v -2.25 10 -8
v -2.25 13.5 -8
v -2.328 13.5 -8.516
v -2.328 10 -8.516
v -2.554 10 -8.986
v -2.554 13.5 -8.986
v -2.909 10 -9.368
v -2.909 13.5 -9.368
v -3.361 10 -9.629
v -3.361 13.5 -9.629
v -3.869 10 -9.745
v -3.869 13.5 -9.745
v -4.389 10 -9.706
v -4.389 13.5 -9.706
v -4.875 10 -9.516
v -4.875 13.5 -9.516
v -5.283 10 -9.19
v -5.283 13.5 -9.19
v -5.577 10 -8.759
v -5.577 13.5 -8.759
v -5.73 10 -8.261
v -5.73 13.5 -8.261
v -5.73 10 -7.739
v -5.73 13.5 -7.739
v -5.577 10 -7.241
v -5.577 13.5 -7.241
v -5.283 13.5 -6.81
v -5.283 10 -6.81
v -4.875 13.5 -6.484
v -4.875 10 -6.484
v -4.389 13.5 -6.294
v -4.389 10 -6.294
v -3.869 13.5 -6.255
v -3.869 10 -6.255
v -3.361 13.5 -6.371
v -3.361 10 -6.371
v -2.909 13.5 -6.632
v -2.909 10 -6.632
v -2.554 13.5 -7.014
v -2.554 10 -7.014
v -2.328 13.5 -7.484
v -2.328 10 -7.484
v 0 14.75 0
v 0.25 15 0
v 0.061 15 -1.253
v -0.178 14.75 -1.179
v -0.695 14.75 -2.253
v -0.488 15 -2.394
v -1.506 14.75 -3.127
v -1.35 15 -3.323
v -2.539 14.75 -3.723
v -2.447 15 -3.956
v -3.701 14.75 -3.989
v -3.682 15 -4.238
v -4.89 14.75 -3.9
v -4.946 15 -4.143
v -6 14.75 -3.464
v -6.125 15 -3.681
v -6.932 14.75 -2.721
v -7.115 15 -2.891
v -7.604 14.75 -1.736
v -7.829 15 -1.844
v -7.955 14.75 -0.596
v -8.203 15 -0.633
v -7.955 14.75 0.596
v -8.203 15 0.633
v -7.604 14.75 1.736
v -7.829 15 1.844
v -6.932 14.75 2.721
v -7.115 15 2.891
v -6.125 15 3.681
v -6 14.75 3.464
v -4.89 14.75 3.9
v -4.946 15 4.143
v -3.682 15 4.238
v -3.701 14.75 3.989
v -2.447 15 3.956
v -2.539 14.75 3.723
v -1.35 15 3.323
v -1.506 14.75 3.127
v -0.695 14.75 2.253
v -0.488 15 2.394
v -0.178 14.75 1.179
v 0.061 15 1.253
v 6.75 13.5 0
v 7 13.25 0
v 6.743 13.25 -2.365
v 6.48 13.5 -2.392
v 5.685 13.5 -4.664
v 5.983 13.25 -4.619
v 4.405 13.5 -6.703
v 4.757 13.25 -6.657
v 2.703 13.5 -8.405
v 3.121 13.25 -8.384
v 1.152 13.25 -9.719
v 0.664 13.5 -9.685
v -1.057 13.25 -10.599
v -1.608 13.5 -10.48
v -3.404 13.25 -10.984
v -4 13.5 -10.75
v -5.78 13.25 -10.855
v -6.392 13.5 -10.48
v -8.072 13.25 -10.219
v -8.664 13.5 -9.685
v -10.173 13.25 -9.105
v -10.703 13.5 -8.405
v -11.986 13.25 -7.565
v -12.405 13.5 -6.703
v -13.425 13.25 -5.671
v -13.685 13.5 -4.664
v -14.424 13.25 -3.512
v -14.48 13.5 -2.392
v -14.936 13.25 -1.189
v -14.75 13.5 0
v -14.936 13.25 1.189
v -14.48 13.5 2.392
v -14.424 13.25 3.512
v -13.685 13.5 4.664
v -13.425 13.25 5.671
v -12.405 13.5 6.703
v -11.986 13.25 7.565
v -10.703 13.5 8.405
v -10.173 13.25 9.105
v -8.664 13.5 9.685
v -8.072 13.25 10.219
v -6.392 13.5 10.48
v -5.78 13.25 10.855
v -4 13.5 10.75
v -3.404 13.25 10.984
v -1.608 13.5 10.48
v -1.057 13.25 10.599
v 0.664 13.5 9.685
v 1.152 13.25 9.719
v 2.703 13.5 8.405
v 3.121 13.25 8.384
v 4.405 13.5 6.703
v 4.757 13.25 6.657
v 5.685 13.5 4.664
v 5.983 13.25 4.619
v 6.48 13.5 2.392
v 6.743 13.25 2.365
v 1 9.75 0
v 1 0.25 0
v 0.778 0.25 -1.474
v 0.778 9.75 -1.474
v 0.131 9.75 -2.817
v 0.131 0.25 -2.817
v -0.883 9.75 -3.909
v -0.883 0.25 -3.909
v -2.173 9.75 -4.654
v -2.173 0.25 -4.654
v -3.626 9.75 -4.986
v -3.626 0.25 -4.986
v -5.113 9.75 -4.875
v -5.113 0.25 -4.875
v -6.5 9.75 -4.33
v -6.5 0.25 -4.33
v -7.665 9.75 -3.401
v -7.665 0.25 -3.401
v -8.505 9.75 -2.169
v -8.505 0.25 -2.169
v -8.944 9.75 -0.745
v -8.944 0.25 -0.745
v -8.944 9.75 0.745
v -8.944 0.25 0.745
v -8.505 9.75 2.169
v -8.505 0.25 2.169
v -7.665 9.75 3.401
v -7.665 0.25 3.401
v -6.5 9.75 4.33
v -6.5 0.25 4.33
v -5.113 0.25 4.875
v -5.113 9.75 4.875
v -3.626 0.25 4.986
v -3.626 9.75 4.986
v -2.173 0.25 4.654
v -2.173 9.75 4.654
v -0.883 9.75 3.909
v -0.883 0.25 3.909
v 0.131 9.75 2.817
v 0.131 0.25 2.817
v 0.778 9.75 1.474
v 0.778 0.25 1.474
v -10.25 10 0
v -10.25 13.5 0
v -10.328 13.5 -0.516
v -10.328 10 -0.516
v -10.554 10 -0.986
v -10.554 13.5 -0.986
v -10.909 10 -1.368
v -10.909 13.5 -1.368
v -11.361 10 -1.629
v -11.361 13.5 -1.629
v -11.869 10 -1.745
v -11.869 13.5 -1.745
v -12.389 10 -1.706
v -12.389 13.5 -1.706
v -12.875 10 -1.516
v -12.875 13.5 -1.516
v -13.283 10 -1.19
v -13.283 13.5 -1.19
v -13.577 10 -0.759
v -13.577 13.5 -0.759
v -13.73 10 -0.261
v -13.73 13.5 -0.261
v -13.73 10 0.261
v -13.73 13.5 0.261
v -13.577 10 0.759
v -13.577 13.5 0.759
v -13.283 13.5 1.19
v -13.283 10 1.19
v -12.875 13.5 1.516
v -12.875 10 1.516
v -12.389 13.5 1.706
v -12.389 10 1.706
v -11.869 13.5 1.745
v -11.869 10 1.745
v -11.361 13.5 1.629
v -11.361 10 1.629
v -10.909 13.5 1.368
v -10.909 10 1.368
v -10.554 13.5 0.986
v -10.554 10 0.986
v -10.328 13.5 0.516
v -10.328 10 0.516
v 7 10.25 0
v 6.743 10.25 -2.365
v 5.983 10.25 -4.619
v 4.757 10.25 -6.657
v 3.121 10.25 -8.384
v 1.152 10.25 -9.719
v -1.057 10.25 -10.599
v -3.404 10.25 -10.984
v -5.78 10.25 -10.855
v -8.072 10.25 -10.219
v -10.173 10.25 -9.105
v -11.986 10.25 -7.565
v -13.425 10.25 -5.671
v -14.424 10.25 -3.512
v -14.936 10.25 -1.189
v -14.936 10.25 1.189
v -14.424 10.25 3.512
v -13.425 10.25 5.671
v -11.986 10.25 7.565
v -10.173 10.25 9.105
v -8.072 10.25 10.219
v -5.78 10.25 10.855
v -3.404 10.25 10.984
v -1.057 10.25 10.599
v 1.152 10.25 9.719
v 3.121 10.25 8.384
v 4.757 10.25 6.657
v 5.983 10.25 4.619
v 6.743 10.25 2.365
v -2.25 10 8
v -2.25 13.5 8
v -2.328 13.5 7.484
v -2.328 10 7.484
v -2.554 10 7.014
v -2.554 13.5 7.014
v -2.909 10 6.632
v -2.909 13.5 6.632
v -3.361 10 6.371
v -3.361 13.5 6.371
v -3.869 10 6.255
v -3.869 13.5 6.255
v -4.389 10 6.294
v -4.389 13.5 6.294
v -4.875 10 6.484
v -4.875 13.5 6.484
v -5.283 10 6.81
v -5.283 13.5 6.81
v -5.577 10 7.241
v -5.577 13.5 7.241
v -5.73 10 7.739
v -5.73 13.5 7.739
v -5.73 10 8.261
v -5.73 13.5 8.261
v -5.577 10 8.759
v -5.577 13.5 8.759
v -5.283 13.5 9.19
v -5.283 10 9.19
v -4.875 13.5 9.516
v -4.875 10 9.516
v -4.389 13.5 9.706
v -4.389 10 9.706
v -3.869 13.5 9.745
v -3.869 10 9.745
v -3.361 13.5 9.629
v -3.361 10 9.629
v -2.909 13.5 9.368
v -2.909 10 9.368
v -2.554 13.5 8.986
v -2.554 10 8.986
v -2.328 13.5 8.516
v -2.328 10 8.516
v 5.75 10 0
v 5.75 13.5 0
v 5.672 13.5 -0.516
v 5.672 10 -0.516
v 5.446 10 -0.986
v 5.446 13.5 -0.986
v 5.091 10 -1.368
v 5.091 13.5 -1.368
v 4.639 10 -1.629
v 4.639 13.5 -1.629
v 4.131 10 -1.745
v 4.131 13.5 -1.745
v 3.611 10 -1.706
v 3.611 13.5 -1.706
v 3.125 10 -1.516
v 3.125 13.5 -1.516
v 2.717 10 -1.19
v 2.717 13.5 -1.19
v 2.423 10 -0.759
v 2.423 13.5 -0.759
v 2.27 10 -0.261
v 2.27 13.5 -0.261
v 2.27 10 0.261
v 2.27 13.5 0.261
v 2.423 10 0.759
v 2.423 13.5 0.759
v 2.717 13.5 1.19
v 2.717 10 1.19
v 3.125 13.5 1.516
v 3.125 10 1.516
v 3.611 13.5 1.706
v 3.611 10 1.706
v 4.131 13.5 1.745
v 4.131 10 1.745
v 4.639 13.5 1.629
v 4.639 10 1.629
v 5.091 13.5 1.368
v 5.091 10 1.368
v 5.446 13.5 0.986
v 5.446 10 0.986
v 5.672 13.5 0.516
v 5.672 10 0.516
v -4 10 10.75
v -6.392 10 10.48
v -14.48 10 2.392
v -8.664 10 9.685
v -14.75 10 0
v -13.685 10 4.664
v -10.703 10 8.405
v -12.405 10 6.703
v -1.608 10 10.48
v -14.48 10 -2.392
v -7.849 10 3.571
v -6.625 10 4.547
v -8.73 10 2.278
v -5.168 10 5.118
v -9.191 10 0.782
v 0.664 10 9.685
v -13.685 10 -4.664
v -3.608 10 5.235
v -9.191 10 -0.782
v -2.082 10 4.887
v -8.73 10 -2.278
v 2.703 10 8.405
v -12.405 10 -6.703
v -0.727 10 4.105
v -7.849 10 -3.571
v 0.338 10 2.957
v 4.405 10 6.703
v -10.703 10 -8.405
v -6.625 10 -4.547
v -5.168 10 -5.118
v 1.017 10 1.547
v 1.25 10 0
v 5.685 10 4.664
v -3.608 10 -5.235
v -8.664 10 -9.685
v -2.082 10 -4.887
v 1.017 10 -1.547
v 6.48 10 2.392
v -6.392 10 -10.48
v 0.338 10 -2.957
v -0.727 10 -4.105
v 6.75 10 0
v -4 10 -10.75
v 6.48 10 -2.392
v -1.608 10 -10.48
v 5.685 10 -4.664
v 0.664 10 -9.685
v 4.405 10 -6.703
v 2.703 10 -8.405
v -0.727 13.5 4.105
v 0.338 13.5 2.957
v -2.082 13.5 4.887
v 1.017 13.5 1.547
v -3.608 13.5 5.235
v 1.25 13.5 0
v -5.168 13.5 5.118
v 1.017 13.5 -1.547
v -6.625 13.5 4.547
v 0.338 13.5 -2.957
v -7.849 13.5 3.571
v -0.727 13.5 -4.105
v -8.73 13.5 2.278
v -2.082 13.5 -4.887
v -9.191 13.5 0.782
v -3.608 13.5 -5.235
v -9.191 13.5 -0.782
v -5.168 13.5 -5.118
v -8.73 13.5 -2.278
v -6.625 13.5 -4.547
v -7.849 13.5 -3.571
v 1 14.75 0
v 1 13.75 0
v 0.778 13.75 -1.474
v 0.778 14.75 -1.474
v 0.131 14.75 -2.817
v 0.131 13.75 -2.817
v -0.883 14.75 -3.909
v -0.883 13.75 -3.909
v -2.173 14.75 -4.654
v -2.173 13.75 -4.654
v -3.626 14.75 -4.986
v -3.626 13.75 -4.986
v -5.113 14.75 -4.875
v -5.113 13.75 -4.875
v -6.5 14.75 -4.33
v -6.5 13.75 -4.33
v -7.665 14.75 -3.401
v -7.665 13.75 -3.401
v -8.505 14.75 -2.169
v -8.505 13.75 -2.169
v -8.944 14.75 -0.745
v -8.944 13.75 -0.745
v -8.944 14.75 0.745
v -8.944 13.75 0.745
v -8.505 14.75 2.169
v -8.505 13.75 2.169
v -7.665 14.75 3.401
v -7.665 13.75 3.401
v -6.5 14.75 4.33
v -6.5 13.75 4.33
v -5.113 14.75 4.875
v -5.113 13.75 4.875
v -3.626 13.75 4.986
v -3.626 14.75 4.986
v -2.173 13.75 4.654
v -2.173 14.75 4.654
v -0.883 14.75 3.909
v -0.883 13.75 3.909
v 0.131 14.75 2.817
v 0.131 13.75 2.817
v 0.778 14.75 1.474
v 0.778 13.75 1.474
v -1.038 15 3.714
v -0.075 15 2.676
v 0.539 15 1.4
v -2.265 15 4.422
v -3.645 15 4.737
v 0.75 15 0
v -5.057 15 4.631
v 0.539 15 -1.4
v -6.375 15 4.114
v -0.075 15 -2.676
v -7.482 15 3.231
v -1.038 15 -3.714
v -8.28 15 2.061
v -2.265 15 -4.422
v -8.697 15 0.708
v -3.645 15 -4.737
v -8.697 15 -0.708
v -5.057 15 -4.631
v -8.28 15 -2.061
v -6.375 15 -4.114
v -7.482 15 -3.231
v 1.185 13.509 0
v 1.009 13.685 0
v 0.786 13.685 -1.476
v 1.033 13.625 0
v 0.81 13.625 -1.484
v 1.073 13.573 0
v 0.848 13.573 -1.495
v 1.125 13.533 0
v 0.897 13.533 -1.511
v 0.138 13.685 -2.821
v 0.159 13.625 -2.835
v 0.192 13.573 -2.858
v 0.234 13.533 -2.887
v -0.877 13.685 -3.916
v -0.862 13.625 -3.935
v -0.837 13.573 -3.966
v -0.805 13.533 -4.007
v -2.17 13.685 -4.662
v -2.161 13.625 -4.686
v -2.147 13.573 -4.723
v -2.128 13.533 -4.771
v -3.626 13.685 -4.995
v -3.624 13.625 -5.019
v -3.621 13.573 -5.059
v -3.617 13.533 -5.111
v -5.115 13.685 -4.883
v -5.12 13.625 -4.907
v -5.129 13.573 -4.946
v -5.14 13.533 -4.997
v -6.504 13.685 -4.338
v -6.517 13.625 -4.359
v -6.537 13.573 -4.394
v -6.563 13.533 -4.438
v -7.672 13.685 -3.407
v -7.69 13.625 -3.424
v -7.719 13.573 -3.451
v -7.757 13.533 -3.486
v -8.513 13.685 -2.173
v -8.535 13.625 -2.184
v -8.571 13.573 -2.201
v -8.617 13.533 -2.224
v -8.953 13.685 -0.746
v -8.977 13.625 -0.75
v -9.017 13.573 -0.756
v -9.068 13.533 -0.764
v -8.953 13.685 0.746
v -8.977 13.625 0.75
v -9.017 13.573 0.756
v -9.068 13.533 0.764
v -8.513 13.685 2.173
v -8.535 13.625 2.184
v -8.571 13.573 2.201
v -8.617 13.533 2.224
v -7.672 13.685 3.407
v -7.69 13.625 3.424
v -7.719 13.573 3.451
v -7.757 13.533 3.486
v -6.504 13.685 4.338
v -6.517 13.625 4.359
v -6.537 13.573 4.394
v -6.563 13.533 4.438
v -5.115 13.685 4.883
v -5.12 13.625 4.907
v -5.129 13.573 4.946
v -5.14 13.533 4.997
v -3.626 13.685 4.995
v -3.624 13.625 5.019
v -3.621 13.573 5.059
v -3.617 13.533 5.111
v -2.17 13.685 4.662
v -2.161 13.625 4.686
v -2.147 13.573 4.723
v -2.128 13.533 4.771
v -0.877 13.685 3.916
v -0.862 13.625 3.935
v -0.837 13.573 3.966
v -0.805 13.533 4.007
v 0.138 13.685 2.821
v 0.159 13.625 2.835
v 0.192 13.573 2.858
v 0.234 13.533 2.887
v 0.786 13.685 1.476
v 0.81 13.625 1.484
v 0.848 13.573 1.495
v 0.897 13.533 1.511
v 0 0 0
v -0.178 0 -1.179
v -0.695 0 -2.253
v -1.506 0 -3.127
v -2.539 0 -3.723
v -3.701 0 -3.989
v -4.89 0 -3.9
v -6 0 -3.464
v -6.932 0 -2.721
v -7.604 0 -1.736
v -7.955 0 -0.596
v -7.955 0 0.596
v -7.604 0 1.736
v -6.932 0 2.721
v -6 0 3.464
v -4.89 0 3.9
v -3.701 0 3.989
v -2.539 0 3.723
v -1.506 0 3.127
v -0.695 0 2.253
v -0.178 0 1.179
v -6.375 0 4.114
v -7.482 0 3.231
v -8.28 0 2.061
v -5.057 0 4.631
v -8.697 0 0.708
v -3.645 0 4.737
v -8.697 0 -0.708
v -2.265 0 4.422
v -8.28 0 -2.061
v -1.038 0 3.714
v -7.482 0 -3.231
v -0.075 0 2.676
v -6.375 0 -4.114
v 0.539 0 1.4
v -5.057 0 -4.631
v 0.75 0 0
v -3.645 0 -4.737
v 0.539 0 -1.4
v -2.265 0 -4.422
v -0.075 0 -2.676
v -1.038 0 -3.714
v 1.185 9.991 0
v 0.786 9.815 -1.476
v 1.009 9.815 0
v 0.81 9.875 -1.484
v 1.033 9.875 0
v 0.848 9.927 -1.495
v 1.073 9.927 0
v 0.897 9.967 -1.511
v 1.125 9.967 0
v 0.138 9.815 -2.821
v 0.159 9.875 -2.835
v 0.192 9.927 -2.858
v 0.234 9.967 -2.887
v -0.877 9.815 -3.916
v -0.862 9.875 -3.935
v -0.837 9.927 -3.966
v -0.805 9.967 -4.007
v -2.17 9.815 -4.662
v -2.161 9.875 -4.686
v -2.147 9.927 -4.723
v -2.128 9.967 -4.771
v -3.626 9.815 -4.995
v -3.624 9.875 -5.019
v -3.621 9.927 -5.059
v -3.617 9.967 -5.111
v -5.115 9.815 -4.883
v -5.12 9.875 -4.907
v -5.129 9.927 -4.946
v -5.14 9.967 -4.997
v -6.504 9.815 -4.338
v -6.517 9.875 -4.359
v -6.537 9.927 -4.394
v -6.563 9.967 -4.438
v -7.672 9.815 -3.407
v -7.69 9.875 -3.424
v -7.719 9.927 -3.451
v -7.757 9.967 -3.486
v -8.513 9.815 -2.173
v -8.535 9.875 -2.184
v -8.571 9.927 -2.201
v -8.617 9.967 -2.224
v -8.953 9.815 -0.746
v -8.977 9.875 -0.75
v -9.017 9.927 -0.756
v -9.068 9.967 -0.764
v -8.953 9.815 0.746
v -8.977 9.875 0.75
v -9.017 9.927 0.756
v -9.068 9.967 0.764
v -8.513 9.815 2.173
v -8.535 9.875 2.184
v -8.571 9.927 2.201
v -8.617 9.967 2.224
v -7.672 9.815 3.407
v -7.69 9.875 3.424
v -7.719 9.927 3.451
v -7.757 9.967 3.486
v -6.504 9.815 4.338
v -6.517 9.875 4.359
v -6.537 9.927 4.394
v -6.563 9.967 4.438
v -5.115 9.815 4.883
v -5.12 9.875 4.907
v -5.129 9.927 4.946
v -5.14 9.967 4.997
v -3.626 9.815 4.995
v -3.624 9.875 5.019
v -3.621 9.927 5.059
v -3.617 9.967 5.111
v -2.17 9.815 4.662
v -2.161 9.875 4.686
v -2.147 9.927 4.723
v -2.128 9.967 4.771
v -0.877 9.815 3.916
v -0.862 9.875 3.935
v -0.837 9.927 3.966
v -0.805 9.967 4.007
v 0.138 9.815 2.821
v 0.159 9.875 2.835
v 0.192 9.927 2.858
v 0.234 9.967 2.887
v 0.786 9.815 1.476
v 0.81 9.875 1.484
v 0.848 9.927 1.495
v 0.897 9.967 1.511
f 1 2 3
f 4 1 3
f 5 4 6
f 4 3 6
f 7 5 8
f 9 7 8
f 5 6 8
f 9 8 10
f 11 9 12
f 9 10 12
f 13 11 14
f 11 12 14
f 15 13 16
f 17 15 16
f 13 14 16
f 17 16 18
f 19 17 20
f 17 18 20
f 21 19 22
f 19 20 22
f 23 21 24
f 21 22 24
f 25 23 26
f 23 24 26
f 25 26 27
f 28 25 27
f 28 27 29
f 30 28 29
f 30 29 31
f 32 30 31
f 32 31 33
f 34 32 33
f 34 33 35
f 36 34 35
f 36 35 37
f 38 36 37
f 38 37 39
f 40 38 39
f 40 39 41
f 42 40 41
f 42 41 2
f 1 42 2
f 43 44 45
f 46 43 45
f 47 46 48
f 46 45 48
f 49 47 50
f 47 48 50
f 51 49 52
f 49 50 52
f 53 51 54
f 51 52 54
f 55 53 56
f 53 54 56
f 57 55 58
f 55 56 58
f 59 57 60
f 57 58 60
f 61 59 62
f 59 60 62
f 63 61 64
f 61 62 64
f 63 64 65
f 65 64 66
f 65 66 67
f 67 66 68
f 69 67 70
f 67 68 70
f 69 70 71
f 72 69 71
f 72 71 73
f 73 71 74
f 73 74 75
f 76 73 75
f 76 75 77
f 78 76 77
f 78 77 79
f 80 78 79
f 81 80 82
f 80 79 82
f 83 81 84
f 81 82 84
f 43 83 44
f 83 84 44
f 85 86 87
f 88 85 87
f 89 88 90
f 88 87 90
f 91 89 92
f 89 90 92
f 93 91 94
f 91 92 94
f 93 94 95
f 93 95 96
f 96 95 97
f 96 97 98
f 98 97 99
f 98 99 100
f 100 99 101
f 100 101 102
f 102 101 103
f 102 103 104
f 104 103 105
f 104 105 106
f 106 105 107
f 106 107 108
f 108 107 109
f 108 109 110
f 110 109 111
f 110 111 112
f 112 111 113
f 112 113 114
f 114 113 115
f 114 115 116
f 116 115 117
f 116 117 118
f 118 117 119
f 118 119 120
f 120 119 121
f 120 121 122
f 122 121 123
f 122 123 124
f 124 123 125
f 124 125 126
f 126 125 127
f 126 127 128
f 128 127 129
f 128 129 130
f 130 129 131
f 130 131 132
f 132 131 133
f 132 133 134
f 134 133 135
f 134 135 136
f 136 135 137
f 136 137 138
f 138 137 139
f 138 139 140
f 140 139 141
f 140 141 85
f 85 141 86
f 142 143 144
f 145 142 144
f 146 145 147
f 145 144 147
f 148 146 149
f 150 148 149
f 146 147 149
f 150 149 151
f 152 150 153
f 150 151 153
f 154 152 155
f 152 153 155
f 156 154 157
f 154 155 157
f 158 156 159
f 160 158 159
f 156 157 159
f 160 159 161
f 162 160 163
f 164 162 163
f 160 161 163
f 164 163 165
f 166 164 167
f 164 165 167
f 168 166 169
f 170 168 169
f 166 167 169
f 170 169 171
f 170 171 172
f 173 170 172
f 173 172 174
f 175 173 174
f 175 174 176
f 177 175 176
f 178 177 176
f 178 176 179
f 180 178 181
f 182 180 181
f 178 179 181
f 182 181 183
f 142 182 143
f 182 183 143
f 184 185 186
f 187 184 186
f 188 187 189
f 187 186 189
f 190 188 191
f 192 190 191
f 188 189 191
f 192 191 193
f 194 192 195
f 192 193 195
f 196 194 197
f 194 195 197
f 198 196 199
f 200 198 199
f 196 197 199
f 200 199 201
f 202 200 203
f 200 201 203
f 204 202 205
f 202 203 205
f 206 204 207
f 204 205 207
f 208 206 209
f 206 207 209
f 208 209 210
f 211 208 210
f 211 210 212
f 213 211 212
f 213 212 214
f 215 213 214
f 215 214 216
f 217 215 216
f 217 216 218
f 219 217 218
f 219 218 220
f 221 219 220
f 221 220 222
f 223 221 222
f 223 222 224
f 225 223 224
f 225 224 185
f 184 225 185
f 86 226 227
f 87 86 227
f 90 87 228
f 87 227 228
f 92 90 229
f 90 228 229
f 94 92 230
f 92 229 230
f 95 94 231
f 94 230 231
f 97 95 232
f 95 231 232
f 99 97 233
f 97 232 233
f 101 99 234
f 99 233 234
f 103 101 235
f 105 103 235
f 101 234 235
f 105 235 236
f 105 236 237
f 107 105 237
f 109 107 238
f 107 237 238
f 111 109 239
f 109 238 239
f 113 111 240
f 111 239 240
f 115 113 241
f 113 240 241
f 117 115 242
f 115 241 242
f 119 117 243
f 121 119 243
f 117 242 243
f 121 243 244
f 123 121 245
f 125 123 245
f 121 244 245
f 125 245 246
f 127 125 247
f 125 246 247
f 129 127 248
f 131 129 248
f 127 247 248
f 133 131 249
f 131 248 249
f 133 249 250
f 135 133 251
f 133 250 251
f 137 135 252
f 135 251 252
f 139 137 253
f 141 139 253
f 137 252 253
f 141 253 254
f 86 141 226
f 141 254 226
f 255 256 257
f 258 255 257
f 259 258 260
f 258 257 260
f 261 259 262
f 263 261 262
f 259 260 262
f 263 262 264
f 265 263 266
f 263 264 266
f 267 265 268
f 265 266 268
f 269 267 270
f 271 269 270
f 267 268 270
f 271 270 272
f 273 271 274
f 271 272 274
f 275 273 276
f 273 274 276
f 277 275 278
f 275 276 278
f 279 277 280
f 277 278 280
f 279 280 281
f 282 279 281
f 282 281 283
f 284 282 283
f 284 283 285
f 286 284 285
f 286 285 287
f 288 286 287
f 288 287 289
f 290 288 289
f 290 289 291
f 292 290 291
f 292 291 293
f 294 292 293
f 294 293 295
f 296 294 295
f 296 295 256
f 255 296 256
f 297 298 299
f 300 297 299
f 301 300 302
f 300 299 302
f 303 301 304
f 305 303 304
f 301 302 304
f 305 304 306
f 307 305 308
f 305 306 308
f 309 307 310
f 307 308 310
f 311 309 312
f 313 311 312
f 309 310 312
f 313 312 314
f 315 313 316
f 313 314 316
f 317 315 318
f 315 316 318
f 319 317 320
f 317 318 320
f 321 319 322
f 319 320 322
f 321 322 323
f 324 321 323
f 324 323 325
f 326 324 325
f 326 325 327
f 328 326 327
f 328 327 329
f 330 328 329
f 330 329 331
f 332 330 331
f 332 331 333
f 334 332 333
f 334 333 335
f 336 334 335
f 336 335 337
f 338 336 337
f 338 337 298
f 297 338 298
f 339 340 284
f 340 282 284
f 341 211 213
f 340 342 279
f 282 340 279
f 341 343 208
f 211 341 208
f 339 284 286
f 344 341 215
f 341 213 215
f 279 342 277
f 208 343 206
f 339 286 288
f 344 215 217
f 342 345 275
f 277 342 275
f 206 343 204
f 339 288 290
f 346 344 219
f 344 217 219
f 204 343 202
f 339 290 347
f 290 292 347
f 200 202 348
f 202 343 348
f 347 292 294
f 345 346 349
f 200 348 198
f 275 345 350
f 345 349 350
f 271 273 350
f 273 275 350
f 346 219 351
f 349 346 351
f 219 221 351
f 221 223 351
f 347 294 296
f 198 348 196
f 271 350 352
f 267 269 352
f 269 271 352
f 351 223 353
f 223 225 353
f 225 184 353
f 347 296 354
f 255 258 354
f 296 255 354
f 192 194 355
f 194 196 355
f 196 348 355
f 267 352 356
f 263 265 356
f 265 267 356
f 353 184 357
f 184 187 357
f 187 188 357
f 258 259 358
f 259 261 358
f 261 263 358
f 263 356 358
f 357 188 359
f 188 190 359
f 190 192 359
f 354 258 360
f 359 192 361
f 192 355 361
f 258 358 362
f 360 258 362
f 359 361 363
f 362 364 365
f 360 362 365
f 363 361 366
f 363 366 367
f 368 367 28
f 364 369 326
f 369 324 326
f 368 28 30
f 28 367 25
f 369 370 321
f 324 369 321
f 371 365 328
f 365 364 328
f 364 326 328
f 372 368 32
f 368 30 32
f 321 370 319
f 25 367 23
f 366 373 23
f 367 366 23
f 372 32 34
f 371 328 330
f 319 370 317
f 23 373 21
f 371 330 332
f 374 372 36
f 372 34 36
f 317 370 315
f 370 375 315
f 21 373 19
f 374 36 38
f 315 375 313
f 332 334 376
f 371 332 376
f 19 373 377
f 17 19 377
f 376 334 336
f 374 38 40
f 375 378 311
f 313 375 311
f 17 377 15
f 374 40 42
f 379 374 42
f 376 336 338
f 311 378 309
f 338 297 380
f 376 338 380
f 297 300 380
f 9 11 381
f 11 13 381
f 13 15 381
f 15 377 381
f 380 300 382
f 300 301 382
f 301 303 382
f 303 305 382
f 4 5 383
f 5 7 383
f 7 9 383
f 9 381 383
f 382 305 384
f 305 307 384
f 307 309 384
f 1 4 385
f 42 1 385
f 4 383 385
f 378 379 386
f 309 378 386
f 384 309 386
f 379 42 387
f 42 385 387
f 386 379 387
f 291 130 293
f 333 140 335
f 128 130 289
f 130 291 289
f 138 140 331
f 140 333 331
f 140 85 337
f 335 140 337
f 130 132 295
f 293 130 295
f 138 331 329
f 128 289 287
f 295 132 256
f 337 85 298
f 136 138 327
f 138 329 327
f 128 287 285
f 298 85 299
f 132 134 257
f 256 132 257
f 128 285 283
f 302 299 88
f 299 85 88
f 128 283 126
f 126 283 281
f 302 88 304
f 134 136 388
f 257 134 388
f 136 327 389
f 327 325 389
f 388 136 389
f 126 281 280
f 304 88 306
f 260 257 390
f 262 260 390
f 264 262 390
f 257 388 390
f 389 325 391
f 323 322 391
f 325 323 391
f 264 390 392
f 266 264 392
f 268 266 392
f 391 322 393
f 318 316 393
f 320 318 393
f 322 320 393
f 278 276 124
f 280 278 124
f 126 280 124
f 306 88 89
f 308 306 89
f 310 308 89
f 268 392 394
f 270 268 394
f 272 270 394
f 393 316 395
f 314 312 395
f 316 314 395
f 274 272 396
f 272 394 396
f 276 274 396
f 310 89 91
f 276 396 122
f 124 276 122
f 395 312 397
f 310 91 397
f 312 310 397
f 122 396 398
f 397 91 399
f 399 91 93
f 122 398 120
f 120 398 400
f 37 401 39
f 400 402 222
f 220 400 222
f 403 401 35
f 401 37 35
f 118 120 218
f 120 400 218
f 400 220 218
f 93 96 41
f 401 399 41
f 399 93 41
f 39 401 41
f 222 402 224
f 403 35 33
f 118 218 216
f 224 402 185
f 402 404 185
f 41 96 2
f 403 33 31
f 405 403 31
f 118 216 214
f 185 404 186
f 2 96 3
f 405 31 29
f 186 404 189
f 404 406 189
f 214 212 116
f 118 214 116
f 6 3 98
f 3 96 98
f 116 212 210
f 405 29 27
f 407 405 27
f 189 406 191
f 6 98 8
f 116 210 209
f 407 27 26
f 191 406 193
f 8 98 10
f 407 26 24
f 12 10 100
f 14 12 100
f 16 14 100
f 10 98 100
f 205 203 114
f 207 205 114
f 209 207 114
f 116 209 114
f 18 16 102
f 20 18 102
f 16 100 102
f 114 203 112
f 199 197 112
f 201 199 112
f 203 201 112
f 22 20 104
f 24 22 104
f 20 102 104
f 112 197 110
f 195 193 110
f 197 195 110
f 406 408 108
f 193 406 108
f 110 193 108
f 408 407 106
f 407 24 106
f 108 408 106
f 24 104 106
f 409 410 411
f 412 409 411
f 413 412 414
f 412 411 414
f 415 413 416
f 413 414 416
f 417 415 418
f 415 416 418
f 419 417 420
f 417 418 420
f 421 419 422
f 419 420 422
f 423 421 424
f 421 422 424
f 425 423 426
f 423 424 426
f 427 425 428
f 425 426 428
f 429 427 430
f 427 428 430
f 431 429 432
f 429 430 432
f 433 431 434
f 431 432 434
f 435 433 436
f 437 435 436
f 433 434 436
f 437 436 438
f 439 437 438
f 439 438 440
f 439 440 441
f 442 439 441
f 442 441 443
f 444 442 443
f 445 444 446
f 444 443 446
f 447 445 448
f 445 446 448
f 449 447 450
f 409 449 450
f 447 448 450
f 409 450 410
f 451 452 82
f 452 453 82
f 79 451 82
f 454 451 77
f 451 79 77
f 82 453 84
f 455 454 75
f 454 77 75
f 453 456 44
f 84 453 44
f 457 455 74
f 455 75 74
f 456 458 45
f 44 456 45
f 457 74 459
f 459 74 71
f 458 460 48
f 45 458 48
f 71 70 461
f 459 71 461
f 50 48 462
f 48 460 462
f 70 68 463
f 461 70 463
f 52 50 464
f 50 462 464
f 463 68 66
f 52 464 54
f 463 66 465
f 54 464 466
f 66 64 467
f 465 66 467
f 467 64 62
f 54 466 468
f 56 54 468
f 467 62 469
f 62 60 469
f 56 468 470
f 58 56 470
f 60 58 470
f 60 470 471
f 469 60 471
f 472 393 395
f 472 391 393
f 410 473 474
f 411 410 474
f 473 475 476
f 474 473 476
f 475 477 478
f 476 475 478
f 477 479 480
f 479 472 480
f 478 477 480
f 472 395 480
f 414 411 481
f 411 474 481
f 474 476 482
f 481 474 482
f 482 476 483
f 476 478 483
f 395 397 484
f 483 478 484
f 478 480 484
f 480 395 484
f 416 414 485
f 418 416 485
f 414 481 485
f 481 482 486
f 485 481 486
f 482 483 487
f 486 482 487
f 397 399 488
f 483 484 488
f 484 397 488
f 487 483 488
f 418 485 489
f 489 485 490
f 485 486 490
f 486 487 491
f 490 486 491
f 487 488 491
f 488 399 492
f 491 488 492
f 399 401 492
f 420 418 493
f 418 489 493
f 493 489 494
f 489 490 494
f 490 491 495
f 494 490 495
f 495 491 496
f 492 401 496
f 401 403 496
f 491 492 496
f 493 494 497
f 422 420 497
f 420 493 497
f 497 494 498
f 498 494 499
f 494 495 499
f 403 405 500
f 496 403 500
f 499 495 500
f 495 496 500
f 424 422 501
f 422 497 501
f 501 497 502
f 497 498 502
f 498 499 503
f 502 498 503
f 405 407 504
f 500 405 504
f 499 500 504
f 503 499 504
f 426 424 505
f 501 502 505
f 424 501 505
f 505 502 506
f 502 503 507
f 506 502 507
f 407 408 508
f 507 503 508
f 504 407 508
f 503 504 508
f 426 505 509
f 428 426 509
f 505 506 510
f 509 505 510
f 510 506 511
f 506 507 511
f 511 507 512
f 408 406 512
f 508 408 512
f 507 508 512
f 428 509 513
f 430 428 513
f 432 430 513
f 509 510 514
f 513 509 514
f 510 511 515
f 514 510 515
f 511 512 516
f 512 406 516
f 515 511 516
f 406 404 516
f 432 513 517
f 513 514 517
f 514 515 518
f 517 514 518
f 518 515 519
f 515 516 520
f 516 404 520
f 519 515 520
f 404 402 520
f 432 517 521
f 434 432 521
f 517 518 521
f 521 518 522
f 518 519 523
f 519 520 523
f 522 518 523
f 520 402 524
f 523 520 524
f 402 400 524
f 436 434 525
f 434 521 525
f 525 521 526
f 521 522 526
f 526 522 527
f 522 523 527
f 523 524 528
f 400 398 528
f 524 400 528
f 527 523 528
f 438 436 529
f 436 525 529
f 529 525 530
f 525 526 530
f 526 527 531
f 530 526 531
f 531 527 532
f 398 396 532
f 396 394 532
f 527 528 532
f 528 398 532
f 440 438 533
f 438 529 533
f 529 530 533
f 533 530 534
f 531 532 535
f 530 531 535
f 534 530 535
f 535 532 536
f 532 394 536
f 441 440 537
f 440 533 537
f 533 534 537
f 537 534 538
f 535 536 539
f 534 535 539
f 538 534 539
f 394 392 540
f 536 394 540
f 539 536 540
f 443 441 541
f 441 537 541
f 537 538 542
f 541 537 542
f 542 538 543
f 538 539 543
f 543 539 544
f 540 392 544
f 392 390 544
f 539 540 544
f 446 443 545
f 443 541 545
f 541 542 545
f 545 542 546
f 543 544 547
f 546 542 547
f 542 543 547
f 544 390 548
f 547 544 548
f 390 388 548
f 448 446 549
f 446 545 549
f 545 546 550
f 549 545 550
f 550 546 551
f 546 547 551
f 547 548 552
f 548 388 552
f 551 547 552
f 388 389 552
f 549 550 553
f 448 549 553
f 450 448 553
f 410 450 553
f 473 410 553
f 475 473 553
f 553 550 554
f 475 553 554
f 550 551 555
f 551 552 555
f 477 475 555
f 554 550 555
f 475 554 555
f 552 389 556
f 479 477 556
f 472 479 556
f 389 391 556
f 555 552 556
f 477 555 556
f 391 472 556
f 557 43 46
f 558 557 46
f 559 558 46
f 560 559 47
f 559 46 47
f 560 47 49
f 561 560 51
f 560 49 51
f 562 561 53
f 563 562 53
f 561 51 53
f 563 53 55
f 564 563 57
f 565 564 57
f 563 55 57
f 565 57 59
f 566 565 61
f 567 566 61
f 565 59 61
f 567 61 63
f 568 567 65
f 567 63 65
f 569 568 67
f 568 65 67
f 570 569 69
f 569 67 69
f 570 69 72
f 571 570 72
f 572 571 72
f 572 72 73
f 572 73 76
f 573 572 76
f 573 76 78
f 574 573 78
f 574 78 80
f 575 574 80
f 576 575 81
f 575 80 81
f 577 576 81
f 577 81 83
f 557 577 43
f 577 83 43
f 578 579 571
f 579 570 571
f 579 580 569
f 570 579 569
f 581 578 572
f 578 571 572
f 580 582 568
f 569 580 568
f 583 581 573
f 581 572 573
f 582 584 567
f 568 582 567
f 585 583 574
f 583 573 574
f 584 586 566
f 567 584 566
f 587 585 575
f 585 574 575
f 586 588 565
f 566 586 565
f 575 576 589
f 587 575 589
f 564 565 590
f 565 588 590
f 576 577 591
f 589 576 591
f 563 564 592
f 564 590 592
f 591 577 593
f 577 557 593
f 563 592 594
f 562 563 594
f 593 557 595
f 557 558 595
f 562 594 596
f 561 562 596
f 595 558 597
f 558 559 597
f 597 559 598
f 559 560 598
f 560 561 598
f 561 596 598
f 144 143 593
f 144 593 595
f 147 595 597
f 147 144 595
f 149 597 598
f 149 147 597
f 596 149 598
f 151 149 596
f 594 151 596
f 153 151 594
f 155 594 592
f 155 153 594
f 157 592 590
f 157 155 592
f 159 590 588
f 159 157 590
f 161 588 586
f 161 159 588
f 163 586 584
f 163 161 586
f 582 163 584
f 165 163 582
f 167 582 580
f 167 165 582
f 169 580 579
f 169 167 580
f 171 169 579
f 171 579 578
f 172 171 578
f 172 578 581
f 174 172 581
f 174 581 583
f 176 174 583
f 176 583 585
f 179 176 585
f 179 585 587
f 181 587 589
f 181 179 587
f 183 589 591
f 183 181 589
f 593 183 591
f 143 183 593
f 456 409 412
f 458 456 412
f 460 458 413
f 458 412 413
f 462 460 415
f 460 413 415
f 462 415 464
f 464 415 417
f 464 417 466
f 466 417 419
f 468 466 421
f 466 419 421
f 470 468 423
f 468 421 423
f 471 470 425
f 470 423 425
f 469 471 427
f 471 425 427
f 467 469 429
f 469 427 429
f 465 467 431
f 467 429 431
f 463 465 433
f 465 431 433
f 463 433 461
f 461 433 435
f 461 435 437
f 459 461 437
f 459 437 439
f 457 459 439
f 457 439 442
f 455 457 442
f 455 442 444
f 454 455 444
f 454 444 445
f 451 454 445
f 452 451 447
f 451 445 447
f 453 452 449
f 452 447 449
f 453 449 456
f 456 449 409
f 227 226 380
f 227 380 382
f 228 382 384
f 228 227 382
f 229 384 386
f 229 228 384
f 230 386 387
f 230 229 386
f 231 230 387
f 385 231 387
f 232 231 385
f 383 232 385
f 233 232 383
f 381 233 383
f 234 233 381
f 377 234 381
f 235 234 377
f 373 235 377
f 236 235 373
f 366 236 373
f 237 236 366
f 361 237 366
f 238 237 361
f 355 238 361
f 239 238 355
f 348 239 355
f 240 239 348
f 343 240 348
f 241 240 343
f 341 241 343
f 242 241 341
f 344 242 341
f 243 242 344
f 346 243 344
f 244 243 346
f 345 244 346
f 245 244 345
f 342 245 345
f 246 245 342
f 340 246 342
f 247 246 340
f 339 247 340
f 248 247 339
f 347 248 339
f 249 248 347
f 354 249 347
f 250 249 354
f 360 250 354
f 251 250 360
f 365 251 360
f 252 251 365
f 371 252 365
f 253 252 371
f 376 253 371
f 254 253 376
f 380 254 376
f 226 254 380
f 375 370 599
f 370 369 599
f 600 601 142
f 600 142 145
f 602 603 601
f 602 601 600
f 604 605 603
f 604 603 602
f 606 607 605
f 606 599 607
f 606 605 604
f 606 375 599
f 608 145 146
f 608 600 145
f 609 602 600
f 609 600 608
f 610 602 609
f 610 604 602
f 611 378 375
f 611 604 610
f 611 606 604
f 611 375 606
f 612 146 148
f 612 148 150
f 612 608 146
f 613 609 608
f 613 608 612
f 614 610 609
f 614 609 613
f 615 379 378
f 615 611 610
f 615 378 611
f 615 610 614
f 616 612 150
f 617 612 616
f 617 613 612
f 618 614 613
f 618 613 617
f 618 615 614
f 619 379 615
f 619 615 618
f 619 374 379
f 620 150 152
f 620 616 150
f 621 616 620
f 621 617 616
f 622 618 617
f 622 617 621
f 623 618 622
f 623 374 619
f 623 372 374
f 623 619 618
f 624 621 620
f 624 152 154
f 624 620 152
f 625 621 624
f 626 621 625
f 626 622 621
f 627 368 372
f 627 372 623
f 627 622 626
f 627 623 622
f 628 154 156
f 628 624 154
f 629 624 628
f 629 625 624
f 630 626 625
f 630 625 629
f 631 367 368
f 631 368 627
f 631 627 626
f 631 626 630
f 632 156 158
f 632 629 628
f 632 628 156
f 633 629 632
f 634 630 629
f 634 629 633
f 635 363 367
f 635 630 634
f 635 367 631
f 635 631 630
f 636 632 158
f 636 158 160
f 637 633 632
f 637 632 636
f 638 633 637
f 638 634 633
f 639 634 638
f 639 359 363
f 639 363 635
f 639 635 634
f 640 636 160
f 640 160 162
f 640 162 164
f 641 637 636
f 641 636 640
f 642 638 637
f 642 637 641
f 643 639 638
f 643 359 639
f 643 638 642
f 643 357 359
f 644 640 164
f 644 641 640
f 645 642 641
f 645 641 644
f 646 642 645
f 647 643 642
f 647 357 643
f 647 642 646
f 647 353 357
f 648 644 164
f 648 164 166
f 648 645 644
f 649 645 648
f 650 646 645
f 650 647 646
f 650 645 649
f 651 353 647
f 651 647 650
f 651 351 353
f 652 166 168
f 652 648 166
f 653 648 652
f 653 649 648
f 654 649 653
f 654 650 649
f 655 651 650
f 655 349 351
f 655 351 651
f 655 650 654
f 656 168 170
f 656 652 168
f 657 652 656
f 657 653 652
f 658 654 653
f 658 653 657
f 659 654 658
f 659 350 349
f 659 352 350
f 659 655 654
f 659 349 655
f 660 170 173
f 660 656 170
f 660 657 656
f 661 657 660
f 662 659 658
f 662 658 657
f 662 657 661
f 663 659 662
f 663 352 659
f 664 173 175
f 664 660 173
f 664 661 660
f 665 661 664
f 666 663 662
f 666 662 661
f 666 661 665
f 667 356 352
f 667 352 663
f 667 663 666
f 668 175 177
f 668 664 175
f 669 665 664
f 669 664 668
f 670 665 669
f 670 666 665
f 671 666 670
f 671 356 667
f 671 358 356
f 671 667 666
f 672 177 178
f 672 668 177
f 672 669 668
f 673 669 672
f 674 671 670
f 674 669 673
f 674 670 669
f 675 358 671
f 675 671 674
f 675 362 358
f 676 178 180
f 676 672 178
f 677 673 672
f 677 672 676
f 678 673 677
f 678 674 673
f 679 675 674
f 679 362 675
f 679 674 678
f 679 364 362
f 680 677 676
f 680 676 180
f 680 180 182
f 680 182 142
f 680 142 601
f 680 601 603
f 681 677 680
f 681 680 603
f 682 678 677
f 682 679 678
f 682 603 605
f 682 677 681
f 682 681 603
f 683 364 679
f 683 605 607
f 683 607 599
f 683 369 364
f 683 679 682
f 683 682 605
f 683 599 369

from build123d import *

# Parameters (mm, degrees)
SCHIZZO2_R               = 1.75
TAGLIO_ESTRUSIONE1_DEPTH = 10
SMUSSO1_SIZE             = 0.25
RACCORDO1_R              = 0.25


with BuildPart() as part:
    # Schizzo1 → Rivoluzione1 (revolve)
    with BuildSketch(Plane.XY):
        Polygon((0, 0), (0, 15), (1, 15), (1, 13.5), (7, 13.5), (7, 10), (1, 10), (1, 0), align=None)
    revolve(axis=Axis((-4, 0, 0), (0, 1, 0)))

    # Schizzo2 → Taglio-Estrusione1 (cut)
    with BuildSketch(Plane(origin=(0, 13.5, 0), x_dir=(1, 0, 0), z_dir=(0, 1, 0))):
        with Locations((-4, -8)):
            Circle(SCHIZZO2_R)
        with Locations((-12, 0)):
            Circle(SCHIZZO2_R)
        with Locations((-4, 8)):
            Circle(SCHIZZO2_R)
        with Locations((4, 0)):
            Circle(SCHIZZO2_R)
    extrude(amount=-TAGLIO_ESTRUSIONE1_DEPTH, mode=Mode.SUBTRACT)

    # Smusso1
    smusso1_edges = [part.edges().sort_by_distance(p)[0] for p in [
        (-15, 10, 0),
        (-9, 0, 0),
        (-8, 15, 0),
        (-9, 15, 0),
        (-15, 13.5, 0),
    ]]
    chamfer(smusso1_edges, length=SMUSSO1_SIZE)

    # Raccordo1
    raccordo1_edges = [part.edges().sort_by_distance(p)[0] for p in [
        (-9, 10, 0),
        (-9, 13.5, 0),
    ]]
    fillet(raccordo1_edges, radius=RACCORDO1_R)


solid = part.part
